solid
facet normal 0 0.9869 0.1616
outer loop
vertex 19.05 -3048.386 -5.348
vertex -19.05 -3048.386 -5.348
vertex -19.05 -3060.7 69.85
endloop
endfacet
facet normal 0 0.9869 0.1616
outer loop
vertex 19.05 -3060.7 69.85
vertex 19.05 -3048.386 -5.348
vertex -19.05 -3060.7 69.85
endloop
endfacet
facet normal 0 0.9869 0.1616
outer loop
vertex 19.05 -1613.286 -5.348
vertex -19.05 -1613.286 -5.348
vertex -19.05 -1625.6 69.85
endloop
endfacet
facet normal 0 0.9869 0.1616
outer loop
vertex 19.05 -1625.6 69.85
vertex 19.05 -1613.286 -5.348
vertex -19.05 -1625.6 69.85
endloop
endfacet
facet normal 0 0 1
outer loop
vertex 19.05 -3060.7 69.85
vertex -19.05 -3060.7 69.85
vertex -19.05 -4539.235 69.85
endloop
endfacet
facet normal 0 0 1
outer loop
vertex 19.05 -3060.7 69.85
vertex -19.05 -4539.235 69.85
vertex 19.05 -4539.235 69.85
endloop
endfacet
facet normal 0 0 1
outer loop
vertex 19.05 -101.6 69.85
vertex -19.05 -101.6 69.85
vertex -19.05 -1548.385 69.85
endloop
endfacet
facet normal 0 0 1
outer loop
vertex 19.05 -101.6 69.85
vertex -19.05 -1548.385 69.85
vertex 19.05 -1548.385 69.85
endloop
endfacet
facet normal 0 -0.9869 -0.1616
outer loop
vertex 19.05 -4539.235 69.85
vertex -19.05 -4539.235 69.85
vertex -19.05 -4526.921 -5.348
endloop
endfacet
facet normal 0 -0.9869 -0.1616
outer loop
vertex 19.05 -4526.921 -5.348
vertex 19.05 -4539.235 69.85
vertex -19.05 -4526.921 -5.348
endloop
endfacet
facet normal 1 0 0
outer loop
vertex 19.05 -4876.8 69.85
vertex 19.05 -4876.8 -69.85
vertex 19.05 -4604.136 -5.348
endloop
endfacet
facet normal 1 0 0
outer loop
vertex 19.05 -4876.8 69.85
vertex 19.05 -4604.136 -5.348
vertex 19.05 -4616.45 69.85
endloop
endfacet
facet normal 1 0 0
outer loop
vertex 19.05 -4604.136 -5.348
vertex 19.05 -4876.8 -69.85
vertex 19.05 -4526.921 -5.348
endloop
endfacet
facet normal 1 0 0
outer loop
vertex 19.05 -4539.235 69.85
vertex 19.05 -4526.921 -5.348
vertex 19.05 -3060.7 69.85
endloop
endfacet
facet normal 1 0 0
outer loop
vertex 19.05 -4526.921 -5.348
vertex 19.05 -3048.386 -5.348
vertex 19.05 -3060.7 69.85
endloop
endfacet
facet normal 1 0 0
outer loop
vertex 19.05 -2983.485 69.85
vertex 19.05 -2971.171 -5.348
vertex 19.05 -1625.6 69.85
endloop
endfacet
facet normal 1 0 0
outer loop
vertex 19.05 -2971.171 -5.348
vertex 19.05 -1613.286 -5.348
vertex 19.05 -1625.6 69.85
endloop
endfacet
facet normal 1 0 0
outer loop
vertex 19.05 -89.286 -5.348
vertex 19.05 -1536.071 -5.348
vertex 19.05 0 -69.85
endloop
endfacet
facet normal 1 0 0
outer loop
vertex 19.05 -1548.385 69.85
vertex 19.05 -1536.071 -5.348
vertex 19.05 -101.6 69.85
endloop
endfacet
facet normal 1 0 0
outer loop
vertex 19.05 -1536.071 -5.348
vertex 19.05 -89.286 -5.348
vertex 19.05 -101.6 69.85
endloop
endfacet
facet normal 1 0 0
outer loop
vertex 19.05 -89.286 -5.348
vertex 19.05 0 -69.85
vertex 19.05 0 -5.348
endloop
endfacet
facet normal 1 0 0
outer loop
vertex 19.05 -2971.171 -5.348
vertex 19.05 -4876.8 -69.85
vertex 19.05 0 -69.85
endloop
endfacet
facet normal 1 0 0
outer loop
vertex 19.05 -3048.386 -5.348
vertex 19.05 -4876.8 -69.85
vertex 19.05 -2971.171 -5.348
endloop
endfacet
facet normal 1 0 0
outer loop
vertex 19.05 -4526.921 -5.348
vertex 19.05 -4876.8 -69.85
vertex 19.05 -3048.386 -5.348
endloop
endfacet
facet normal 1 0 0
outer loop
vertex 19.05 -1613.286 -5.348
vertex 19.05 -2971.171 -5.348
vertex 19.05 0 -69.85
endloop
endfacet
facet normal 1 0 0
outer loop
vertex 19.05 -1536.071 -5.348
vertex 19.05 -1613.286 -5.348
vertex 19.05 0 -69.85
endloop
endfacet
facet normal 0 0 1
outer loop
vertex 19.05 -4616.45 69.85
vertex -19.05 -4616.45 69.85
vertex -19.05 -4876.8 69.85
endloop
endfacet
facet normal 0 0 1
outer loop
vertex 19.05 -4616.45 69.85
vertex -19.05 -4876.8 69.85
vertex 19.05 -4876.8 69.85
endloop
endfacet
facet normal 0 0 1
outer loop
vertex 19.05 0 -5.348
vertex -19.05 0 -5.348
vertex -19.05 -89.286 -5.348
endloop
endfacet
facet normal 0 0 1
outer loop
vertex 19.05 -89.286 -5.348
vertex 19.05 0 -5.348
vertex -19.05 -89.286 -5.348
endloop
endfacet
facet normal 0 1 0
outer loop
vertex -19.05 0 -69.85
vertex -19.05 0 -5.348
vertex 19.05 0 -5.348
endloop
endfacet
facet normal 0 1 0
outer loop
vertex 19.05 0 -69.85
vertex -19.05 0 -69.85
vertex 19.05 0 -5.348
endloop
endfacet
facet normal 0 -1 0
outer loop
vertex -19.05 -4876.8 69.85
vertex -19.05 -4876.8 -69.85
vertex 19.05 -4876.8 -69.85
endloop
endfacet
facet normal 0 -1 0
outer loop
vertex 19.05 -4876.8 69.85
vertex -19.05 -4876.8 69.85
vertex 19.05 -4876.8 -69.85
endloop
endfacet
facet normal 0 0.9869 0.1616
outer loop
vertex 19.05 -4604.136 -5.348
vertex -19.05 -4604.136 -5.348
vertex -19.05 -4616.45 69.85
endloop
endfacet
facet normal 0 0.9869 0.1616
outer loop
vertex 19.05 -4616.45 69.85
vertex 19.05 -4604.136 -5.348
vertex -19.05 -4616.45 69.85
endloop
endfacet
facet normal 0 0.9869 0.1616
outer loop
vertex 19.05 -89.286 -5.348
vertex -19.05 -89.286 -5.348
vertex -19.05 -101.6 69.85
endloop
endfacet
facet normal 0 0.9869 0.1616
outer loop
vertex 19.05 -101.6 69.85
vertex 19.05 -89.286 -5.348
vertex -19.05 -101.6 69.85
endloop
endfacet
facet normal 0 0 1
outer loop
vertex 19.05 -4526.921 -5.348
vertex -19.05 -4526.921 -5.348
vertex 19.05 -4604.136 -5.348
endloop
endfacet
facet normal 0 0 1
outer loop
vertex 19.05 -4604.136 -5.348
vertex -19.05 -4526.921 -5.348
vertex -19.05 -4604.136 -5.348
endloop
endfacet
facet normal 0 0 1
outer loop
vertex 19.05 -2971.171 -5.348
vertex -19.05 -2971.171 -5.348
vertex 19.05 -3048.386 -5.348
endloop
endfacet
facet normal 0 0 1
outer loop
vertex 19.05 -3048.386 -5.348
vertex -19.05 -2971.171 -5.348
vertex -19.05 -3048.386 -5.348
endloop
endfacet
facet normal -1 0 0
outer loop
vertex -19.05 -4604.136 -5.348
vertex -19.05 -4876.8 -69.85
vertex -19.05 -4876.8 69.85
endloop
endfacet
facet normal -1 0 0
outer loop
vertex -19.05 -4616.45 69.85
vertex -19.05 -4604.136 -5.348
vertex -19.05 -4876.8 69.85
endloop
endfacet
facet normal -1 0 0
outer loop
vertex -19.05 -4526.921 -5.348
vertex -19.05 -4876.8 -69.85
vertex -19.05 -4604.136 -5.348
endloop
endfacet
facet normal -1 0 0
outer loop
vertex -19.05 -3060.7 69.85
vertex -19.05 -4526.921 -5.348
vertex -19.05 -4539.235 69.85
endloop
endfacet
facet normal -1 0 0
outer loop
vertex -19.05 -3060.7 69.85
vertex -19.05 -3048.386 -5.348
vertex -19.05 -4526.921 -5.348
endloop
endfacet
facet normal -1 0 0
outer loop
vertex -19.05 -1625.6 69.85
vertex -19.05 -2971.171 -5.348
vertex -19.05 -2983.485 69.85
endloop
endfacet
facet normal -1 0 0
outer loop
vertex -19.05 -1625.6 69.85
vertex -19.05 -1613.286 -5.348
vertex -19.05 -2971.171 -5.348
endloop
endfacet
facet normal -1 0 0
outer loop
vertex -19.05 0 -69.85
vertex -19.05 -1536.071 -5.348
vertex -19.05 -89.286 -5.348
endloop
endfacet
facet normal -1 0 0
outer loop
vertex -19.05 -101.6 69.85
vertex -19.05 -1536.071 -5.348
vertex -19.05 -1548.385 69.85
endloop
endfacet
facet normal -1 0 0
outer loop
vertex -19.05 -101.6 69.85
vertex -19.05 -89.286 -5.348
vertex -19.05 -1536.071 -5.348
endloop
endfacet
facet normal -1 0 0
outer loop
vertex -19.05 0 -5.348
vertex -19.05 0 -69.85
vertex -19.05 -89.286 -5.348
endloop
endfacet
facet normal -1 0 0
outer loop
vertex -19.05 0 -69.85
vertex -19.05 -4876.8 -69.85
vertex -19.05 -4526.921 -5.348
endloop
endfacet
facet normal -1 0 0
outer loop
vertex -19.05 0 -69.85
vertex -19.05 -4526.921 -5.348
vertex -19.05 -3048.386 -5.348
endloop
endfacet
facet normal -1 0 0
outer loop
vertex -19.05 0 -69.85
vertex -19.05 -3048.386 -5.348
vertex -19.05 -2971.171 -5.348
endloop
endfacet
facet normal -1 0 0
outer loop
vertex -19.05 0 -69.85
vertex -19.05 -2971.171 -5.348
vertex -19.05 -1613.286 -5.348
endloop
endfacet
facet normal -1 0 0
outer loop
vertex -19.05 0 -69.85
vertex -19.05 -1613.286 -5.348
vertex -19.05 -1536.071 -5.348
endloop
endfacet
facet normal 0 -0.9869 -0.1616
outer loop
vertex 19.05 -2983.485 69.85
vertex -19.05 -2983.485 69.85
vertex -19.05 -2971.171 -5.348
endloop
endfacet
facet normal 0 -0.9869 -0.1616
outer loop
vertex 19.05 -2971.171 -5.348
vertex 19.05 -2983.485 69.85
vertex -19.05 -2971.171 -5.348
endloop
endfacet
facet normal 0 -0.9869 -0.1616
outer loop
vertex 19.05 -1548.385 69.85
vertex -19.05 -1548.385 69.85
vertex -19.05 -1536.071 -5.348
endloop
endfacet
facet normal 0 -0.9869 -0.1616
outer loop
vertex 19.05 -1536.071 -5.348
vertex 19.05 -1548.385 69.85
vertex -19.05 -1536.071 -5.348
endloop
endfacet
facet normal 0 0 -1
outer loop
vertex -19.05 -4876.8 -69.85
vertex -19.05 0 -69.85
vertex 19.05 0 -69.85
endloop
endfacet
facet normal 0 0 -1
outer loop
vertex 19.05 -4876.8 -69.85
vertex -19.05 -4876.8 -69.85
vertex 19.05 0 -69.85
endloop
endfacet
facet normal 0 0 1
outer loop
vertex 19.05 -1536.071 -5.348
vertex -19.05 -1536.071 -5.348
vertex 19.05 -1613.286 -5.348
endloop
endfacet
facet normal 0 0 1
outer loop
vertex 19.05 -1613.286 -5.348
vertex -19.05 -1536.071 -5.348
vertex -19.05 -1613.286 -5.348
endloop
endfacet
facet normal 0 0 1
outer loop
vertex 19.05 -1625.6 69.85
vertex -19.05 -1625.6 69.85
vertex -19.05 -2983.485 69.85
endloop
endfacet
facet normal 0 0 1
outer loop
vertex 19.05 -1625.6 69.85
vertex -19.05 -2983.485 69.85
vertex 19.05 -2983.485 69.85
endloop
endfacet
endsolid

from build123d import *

# Parameters (mm, degrees)
F0_W     = 38.1
F0_H     = 139.7
F1_DEPTH = 4876.8
F3_DEPTH = 254


with BuildPart() as f1:
    # F0 (on Front) → F1 (new body)
    with BuildSketch(Plane.XZ):
        Rectangle(F0_W, F0_H)
    extrude(amount=F1_DEPTH)

    # F2 (on face) → F3 (cut)
    with BuildSketch(Plane(origin=(-19.05, 0, 0), x_dir=(0, -1, 0), z_dir=(-1, 0, 0))):
        Polygon((1625.6, 69.85), (1548.385065, 69.85), (1536.070854, -5.348406), (1613.285789, -5.348406), align=None)
        Polygon((3060.7, 69.85), (2983.485065, 69.85), (2971.170854, -5.348406), (3048.385789, -5.348406), align=None)
        Polygon((4616.45, 69.85), (4539.235065, 69.85), (4526.920854, -5.348406), (4604.135789, -5.348406), align=None)
        Polygon((89.285789, -5.348406), (101.6, 69.85), (0, 69.85), (0, -5.348406), align=None)
    extrude(amount=-F3_DEPTH, mode=Mode.SUBTRACT)


solid = f1.part
